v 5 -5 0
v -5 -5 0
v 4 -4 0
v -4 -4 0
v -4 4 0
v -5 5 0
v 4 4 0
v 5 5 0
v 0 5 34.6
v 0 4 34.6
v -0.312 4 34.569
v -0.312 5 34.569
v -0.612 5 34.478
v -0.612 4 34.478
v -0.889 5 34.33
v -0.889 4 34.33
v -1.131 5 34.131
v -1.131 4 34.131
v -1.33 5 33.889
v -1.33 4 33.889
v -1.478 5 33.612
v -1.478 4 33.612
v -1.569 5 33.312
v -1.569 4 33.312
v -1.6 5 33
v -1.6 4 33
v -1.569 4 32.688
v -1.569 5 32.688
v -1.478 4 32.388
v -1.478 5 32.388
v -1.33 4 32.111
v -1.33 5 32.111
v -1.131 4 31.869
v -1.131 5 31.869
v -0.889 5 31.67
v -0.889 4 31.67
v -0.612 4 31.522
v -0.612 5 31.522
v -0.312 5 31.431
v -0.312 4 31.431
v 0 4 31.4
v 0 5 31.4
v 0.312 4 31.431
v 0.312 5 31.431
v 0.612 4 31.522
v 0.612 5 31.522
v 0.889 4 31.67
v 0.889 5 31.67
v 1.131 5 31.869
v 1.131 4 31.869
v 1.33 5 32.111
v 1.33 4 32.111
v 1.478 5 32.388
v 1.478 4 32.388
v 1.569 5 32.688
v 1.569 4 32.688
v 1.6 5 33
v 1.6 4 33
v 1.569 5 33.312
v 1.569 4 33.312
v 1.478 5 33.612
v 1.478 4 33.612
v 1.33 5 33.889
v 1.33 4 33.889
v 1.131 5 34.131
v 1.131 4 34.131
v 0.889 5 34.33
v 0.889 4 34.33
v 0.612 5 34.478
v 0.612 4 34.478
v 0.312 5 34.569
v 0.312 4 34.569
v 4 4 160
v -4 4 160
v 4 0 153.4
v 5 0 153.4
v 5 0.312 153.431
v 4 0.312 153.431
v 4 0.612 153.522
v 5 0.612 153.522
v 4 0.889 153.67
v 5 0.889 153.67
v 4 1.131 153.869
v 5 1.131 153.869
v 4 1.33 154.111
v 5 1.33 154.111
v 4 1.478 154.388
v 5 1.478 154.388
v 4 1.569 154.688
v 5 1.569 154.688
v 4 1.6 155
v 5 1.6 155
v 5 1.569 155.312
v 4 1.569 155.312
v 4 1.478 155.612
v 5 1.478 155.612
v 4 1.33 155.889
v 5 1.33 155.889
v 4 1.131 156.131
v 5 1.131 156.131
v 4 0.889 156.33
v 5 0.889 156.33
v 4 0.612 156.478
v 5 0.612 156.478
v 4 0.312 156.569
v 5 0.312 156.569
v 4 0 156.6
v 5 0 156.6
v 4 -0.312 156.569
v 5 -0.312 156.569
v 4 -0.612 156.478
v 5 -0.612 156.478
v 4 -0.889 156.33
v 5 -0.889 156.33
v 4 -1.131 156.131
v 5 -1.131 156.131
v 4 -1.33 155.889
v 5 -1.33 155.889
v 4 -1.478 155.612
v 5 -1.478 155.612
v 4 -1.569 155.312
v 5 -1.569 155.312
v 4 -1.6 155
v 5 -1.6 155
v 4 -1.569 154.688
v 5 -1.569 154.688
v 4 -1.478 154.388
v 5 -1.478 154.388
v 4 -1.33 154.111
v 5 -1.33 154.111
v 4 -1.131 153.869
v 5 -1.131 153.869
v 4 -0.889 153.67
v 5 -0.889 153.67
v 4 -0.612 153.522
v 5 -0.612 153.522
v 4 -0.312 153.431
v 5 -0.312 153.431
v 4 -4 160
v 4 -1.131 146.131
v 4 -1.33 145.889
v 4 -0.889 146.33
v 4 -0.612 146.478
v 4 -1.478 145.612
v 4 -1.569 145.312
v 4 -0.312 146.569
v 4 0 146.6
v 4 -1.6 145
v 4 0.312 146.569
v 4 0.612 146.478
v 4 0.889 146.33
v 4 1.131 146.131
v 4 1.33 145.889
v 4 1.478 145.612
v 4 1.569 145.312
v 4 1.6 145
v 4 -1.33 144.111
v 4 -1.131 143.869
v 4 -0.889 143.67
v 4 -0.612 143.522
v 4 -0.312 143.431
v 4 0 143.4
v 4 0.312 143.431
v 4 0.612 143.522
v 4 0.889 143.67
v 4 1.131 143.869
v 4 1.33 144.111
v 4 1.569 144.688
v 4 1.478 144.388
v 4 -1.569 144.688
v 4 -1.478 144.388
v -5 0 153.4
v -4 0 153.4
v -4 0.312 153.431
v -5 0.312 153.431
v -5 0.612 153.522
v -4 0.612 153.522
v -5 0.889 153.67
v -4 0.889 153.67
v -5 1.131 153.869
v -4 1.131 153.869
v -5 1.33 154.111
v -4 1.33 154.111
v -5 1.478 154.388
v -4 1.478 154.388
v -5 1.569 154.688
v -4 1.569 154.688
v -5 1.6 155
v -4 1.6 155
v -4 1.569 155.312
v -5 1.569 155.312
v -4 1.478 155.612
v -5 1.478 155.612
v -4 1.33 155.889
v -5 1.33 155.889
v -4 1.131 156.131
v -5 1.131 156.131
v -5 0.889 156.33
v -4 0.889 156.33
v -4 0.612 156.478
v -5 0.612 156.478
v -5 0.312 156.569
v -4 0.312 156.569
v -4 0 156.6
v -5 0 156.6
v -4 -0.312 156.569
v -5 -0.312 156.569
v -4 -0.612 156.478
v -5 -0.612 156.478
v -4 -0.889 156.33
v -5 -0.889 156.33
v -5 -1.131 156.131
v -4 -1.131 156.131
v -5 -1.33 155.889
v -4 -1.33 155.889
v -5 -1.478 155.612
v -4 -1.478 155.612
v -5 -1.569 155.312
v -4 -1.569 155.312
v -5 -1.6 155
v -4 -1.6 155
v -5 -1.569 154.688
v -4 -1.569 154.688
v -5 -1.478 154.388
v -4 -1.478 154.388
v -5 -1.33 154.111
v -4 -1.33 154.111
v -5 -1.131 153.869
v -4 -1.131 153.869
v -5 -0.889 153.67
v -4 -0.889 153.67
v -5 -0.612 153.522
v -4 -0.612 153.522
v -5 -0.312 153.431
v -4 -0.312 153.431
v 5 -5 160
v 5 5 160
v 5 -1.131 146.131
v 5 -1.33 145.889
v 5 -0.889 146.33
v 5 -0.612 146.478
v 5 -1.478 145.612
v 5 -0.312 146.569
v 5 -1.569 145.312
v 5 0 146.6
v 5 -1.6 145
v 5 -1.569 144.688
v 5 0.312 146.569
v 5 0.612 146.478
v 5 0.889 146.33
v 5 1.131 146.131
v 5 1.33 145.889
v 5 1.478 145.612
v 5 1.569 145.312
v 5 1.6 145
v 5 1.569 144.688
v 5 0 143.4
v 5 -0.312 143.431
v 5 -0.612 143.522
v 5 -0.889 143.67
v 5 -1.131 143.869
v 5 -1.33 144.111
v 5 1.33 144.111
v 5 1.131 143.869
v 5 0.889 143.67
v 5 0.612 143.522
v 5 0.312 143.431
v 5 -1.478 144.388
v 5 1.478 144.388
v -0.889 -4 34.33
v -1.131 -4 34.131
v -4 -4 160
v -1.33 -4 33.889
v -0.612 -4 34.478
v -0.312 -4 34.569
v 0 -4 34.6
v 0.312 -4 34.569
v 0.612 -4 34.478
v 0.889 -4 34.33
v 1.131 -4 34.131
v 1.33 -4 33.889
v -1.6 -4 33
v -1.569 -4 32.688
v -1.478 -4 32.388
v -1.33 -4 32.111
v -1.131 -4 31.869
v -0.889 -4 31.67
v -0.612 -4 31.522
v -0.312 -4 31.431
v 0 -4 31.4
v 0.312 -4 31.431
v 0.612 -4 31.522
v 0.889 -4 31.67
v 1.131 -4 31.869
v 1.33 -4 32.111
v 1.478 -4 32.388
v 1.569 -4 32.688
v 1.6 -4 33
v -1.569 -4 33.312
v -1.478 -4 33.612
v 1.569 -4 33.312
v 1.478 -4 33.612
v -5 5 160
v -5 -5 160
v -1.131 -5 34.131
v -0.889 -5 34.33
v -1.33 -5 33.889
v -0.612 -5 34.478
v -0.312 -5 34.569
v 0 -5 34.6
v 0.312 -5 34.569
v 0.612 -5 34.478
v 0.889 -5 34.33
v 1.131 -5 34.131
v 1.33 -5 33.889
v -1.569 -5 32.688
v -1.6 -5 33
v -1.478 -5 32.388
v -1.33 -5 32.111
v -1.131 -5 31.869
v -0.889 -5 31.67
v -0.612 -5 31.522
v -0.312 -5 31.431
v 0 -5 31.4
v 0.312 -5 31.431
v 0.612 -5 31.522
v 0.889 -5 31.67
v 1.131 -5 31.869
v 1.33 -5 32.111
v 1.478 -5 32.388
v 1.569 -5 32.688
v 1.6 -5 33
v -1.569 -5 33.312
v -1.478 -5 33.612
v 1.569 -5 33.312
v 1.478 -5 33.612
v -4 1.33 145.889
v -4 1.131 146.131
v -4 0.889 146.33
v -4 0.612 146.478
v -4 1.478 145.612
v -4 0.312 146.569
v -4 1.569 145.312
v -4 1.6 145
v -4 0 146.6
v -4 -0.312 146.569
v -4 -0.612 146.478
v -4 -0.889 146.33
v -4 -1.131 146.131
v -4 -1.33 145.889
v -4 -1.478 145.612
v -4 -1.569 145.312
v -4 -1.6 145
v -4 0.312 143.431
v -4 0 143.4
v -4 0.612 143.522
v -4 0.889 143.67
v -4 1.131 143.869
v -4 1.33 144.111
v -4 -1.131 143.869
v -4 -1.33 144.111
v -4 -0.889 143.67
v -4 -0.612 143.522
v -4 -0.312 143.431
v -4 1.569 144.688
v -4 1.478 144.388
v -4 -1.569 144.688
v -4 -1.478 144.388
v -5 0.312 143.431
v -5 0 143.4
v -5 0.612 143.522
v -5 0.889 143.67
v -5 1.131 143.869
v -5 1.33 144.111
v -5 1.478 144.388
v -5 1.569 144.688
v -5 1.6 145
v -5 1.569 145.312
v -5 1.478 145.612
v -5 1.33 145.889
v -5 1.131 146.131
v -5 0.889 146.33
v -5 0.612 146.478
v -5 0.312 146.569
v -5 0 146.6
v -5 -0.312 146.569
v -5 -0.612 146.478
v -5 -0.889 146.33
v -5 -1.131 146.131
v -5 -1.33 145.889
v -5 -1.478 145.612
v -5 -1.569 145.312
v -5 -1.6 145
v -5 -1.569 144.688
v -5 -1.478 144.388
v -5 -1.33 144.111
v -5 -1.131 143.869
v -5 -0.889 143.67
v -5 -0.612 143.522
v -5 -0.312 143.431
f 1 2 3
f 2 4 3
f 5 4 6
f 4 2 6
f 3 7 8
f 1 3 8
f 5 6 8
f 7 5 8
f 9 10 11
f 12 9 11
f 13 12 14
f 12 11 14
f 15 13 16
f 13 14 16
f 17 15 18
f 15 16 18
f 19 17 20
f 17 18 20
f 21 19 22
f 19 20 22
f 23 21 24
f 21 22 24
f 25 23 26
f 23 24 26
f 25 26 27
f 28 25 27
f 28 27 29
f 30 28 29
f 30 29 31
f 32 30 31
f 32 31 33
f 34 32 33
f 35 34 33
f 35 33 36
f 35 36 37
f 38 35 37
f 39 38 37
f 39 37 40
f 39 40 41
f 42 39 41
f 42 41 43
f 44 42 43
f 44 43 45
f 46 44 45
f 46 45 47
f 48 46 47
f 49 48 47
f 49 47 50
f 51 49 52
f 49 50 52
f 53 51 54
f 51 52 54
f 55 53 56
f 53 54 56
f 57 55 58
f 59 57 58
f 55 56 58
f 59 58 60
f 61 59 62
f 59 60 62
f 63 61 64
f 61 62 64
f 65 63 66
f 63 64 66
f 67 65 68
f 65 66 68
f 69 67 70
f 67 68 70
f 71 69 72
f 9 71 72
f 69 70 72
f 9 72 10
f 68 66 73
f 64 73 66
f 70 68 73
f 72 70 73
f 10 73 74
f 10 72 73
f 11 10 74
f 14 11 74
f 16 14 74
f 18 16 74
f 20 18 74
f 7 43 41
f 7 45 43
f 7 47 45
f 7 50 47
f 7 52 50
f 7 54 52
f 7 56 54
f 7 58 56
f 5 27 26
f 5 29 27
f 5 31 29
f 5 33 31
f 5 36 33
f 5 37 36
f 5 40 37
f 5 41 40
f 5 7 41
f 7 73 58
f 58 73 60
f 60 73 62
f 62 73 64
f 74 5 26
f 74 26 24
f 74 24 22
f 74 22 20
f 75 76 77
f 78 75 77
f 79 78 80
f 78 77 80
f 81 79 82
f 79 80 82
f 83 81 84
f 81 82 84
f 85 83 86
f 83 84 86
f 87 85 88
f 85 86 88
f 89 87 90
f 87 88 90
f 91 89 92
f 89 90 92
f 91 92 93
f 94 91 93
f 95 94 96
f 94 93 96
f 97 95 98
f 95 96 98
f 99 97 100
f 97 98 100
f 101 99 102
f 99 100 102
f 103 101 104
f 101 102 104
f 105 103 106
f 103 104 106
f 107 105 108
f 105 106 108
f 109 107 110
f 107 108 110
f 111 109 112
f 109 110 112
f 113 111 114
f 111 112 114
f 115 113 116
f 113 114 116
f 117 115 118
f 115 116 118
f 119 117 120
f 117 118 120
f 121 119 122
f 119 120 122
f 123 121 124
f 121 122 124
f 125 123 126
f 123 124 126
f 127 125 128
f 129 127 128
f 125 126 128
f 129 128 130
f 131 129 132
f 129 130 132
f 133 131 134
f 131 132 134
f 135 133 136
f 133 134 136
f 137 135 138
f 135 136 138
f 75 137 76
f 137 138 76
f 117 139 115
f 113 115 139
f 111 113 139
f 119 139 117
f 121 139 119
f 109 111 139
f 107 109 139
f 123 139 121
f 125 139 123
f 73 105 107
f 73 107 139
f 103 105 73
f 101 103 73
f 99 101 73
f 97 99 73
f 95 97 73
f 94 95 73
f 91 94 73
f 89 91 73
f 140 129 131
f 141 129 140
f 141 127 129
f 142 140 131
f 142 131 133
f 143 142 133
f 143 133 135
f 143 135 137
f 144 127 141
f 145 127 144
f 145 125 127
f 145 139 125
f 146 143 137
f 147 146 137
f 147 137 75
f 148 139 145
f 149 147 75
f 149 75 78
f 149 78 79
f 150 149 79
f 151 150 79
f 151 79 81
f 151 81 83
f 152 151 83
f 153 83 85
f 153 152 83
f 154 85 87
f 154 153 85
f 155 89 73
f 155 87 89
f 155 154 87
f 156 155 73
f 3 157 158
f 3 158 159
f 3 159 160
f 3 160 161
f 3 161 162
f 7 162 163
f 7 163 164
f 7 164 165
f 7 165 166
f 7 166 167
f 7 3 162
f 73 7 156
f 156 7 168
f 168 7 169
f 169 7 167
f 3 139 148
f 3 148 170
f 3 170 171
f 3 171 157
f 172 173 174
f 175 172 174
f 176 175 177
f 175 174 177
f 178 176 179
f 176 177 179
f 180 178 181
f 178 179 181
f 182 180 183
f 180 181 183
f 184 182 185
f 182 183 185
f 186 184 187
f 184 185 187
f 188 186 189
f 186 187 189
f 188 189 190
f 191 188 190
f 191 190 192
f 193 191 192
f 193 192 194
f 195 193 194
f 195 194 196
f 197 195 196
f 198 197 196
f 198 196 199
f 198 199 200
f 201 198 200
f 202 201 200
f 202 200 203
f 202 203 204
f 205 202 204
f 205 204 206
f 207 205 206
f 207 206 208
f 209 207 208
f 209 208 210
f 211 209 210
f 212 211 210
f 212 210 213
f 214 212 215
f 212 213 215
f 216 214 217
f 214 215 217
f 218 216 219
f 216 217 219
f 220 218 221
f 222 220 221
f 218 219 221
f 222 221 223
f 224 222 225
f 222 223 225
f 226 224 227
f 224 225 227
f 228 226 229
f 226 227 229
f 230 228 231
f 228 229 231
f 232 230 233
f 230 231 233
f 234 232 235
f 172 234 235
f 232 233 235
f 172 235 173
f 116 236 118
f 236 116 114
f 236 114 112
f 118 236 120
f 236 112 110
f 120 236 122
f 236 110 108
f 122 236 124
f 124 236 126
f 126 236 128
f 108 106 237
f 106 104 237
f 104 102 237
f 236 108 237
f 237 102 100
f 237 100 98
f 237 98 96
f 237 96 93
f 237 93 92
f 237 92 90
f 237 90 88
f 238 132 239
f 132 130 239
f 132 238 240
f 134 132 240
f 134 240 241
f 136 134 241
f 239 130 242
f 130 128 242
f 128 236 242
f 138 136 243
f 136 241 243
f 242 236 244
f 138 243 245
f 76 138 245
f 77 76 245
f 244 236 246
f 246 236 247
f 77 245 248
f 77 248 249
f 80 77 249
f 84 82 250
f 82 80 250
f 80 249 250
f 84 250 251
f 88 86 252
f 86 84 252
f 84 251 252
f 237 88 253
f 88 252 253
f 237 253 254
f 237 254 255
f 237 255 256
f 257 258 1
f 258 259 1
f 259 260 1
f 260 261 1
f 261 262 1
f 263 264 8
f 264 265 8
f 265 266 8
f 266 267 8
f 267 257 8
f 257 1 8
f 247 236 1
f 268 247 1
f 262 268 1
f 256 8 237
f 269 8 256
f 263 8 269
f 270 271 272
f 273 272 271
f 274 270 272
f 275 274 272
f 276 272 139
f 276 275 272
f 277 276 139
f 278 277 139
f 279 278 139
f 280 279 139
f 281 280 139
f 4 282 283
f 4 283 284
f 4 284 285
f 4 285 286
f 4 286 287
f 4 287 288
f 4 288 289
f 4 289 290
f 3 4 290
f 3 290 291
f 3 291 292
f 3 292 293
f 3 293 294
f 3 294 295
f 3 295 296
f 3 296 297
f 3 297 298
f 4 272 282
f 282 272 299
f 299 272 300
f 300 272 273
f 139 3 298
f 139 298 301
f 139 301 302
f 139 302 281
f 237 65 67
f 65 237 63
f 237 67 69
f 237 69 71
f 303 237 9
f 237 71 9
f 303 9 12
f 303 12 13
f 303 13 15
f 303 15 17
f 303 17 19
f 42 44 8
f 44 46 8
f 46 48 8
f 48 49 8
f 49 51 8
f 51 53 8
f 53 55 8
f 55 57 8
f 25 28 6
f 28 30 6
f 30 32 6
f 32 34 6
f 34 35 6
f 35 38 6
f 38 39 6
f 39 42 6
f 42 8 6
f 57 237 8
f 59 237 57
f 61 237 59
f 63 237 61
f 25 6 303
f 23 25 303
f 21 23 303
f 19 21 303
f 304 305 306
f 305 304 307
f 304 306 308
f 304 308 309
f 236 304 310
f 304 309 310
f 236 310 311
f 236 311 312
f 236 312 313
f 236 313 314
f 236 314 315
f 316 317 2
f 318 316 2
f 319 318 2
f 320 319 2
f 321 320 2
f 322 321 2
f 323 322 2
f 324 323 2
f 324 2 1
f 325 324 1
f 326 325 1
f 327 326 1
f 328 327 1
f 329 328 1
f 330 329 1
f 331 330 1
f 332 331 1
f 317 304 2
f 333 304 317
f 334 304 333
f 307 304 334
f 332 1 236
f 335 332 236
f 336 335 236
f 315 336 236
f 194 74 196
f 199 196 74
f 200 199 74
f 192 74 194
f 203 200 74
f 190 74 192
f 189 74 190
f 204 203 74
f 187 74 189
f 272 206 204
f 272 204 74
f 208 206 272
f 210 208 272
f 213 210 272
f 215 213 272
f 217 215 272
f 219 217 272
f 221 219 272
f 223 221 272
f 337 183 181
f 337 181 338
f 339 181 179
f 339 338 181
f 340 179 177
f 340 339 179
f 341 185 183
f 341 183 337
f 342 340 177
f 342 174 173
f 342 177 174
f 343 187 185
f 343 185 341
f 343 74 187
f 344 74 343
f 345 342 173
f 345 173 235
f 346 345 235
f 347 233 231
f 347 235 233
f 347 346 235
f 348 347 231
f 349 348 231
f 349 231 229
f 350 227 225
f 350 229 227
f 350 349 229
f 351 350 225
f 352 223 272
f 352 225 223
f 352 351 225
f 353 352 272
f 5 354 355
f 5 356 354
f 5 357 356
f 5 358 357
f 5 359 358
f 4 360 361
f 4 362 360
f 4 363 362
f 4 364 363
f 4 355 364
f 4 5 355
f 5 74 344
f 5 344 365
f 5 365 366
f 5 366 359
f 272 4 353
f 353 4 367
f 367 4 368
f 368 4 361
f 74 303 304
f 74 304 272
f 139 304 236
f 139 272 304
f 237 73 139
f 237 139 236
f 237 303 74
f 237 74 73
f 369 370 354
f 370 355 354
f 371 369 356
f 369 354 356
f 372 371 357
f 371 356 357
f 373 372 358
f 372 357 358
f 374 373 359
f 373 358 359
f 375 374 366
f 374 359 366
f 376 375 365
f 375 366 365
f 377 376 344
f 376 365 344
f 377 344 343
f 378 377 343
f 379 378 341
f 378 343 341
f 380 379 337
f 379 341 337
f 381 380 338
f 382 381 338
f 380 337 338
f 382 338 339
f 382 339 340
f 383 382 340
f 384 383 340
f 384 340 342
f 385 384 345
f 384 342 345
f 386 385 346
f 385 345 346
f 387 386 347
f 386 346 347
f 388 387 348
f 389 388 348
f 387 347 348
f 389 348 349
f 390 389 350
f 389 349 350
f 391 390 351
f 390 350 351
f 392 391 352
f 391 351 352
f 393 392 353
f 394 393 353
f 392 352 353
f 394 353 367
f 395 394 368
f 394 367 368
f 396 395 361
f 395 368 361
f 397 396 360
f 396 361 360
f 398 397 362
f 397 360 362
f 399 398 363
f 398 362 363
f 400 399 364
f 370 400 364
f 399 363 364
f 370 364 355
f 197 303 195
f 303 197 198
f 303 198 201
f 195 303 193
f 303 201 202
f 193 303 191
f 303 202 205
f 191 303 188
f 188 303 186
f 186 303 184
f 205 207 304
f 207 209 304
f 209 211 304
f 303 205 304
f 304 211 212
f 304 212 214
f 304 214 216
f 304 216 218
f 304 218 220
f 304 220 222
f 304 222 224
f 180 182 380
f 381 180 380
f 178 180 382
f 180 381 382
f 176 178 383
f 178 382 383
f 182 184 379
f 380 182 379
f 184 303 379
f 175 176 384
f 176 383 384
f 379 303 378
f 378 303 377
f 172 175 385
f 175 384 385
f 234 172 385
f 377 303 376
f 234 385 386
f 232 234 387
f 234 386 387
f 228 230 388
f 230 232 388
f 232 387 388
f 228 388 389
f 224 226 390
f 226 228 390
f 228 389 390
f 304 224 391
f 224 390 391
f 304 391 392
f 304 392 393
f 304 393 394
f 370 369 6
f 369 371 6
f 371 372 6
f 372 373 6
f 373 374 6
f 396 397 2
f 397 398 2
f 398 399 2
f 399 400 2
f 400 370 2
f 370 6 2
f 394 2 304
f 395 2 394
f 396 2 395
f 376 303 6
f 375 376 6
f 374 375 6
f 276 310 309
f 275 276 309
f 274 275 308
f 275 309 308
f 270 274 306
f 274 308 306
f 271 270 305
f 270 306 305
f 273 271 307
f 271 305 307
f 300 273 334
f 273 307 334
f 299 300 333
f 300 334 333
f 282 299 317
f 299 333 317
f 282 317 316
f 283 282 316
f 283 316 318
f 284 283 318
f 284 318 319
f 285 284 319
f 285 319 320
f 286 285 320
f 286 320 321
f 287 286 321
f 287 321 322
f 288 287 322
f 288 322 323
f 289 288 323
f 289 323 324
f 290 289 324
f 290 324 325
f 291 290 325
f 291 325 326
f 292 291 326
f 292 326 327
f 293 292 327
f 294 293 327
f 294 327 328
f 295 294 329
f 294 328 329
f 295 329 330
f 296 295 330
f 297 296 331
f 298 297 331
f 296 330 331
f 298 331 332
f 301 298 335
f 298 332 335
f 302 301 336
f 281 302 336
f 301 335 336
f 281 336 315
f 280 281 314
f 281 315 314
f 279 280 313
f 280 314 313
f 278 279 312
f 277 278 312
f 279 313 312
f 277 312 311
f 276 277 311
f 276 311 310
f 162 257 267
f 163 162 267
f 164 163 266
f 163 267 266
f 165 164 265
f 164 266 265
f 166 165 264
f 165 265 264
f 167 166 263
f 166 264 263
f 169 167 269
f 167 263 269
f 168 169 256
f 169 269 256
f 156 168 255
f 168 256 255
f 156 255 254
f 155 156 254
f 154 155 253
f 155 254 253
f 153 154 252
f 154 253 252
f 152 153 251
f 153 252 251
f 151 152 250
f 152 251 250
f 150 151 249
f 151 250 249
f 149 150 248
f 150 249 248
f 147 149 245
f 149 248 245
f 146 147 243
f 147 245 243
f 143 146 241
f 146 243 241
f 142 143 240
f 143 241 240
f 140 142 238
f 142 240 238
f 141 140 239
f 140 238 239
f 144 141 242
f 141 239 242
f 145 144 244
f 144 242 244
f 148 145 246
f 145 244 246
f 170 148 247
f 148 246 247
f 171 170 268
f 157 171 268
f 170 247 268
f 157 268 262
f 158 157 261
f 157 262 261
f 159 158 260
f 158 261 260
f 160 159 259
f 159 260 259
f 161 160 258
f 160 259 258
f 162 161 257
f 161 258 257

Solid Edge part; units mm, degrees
sketch "Sketch1" plane through (0, 0, 0) normal (0, 0, 1) x (1, 0, 0)
  line L0 (-4, -4) -> (4, -4)
  line L1 (4, -4) -> (4, 4)
  line L2 (4, 4) -> (-4, 4)
  line L3 (-4, 4) -> (-4, -4)
  line L4 (-5, -5) -> (5, -5)
  line L5 (5, -5) -> (5, 5)
  line L6 (5, 5) -> (-5, 5)
  line L7 (-5, 5) -> (-5, -5)
extrude "Protrusion1" add sketch "Sketch1" along normal blind 160
hole "Hole_1" at (5, 0, 155) direction (-1, 0, 0) diameter 3.2 end through all
hole "Hole1" at (5, 0, 145) direction (-1, 0, 0) diameter 3.2 end through all
sketch "Sketch2" plane through (0, -5, 80) normal (0, -1, 0) x (0, 0, 1)
  circle A0 centre (-47, 0) radius 1.6
  dimension "D1" = 33
extrude "Cutout1" cut sketch "Sketch2" against normal blind 33.3
properties material "Aluminum, 1060"
